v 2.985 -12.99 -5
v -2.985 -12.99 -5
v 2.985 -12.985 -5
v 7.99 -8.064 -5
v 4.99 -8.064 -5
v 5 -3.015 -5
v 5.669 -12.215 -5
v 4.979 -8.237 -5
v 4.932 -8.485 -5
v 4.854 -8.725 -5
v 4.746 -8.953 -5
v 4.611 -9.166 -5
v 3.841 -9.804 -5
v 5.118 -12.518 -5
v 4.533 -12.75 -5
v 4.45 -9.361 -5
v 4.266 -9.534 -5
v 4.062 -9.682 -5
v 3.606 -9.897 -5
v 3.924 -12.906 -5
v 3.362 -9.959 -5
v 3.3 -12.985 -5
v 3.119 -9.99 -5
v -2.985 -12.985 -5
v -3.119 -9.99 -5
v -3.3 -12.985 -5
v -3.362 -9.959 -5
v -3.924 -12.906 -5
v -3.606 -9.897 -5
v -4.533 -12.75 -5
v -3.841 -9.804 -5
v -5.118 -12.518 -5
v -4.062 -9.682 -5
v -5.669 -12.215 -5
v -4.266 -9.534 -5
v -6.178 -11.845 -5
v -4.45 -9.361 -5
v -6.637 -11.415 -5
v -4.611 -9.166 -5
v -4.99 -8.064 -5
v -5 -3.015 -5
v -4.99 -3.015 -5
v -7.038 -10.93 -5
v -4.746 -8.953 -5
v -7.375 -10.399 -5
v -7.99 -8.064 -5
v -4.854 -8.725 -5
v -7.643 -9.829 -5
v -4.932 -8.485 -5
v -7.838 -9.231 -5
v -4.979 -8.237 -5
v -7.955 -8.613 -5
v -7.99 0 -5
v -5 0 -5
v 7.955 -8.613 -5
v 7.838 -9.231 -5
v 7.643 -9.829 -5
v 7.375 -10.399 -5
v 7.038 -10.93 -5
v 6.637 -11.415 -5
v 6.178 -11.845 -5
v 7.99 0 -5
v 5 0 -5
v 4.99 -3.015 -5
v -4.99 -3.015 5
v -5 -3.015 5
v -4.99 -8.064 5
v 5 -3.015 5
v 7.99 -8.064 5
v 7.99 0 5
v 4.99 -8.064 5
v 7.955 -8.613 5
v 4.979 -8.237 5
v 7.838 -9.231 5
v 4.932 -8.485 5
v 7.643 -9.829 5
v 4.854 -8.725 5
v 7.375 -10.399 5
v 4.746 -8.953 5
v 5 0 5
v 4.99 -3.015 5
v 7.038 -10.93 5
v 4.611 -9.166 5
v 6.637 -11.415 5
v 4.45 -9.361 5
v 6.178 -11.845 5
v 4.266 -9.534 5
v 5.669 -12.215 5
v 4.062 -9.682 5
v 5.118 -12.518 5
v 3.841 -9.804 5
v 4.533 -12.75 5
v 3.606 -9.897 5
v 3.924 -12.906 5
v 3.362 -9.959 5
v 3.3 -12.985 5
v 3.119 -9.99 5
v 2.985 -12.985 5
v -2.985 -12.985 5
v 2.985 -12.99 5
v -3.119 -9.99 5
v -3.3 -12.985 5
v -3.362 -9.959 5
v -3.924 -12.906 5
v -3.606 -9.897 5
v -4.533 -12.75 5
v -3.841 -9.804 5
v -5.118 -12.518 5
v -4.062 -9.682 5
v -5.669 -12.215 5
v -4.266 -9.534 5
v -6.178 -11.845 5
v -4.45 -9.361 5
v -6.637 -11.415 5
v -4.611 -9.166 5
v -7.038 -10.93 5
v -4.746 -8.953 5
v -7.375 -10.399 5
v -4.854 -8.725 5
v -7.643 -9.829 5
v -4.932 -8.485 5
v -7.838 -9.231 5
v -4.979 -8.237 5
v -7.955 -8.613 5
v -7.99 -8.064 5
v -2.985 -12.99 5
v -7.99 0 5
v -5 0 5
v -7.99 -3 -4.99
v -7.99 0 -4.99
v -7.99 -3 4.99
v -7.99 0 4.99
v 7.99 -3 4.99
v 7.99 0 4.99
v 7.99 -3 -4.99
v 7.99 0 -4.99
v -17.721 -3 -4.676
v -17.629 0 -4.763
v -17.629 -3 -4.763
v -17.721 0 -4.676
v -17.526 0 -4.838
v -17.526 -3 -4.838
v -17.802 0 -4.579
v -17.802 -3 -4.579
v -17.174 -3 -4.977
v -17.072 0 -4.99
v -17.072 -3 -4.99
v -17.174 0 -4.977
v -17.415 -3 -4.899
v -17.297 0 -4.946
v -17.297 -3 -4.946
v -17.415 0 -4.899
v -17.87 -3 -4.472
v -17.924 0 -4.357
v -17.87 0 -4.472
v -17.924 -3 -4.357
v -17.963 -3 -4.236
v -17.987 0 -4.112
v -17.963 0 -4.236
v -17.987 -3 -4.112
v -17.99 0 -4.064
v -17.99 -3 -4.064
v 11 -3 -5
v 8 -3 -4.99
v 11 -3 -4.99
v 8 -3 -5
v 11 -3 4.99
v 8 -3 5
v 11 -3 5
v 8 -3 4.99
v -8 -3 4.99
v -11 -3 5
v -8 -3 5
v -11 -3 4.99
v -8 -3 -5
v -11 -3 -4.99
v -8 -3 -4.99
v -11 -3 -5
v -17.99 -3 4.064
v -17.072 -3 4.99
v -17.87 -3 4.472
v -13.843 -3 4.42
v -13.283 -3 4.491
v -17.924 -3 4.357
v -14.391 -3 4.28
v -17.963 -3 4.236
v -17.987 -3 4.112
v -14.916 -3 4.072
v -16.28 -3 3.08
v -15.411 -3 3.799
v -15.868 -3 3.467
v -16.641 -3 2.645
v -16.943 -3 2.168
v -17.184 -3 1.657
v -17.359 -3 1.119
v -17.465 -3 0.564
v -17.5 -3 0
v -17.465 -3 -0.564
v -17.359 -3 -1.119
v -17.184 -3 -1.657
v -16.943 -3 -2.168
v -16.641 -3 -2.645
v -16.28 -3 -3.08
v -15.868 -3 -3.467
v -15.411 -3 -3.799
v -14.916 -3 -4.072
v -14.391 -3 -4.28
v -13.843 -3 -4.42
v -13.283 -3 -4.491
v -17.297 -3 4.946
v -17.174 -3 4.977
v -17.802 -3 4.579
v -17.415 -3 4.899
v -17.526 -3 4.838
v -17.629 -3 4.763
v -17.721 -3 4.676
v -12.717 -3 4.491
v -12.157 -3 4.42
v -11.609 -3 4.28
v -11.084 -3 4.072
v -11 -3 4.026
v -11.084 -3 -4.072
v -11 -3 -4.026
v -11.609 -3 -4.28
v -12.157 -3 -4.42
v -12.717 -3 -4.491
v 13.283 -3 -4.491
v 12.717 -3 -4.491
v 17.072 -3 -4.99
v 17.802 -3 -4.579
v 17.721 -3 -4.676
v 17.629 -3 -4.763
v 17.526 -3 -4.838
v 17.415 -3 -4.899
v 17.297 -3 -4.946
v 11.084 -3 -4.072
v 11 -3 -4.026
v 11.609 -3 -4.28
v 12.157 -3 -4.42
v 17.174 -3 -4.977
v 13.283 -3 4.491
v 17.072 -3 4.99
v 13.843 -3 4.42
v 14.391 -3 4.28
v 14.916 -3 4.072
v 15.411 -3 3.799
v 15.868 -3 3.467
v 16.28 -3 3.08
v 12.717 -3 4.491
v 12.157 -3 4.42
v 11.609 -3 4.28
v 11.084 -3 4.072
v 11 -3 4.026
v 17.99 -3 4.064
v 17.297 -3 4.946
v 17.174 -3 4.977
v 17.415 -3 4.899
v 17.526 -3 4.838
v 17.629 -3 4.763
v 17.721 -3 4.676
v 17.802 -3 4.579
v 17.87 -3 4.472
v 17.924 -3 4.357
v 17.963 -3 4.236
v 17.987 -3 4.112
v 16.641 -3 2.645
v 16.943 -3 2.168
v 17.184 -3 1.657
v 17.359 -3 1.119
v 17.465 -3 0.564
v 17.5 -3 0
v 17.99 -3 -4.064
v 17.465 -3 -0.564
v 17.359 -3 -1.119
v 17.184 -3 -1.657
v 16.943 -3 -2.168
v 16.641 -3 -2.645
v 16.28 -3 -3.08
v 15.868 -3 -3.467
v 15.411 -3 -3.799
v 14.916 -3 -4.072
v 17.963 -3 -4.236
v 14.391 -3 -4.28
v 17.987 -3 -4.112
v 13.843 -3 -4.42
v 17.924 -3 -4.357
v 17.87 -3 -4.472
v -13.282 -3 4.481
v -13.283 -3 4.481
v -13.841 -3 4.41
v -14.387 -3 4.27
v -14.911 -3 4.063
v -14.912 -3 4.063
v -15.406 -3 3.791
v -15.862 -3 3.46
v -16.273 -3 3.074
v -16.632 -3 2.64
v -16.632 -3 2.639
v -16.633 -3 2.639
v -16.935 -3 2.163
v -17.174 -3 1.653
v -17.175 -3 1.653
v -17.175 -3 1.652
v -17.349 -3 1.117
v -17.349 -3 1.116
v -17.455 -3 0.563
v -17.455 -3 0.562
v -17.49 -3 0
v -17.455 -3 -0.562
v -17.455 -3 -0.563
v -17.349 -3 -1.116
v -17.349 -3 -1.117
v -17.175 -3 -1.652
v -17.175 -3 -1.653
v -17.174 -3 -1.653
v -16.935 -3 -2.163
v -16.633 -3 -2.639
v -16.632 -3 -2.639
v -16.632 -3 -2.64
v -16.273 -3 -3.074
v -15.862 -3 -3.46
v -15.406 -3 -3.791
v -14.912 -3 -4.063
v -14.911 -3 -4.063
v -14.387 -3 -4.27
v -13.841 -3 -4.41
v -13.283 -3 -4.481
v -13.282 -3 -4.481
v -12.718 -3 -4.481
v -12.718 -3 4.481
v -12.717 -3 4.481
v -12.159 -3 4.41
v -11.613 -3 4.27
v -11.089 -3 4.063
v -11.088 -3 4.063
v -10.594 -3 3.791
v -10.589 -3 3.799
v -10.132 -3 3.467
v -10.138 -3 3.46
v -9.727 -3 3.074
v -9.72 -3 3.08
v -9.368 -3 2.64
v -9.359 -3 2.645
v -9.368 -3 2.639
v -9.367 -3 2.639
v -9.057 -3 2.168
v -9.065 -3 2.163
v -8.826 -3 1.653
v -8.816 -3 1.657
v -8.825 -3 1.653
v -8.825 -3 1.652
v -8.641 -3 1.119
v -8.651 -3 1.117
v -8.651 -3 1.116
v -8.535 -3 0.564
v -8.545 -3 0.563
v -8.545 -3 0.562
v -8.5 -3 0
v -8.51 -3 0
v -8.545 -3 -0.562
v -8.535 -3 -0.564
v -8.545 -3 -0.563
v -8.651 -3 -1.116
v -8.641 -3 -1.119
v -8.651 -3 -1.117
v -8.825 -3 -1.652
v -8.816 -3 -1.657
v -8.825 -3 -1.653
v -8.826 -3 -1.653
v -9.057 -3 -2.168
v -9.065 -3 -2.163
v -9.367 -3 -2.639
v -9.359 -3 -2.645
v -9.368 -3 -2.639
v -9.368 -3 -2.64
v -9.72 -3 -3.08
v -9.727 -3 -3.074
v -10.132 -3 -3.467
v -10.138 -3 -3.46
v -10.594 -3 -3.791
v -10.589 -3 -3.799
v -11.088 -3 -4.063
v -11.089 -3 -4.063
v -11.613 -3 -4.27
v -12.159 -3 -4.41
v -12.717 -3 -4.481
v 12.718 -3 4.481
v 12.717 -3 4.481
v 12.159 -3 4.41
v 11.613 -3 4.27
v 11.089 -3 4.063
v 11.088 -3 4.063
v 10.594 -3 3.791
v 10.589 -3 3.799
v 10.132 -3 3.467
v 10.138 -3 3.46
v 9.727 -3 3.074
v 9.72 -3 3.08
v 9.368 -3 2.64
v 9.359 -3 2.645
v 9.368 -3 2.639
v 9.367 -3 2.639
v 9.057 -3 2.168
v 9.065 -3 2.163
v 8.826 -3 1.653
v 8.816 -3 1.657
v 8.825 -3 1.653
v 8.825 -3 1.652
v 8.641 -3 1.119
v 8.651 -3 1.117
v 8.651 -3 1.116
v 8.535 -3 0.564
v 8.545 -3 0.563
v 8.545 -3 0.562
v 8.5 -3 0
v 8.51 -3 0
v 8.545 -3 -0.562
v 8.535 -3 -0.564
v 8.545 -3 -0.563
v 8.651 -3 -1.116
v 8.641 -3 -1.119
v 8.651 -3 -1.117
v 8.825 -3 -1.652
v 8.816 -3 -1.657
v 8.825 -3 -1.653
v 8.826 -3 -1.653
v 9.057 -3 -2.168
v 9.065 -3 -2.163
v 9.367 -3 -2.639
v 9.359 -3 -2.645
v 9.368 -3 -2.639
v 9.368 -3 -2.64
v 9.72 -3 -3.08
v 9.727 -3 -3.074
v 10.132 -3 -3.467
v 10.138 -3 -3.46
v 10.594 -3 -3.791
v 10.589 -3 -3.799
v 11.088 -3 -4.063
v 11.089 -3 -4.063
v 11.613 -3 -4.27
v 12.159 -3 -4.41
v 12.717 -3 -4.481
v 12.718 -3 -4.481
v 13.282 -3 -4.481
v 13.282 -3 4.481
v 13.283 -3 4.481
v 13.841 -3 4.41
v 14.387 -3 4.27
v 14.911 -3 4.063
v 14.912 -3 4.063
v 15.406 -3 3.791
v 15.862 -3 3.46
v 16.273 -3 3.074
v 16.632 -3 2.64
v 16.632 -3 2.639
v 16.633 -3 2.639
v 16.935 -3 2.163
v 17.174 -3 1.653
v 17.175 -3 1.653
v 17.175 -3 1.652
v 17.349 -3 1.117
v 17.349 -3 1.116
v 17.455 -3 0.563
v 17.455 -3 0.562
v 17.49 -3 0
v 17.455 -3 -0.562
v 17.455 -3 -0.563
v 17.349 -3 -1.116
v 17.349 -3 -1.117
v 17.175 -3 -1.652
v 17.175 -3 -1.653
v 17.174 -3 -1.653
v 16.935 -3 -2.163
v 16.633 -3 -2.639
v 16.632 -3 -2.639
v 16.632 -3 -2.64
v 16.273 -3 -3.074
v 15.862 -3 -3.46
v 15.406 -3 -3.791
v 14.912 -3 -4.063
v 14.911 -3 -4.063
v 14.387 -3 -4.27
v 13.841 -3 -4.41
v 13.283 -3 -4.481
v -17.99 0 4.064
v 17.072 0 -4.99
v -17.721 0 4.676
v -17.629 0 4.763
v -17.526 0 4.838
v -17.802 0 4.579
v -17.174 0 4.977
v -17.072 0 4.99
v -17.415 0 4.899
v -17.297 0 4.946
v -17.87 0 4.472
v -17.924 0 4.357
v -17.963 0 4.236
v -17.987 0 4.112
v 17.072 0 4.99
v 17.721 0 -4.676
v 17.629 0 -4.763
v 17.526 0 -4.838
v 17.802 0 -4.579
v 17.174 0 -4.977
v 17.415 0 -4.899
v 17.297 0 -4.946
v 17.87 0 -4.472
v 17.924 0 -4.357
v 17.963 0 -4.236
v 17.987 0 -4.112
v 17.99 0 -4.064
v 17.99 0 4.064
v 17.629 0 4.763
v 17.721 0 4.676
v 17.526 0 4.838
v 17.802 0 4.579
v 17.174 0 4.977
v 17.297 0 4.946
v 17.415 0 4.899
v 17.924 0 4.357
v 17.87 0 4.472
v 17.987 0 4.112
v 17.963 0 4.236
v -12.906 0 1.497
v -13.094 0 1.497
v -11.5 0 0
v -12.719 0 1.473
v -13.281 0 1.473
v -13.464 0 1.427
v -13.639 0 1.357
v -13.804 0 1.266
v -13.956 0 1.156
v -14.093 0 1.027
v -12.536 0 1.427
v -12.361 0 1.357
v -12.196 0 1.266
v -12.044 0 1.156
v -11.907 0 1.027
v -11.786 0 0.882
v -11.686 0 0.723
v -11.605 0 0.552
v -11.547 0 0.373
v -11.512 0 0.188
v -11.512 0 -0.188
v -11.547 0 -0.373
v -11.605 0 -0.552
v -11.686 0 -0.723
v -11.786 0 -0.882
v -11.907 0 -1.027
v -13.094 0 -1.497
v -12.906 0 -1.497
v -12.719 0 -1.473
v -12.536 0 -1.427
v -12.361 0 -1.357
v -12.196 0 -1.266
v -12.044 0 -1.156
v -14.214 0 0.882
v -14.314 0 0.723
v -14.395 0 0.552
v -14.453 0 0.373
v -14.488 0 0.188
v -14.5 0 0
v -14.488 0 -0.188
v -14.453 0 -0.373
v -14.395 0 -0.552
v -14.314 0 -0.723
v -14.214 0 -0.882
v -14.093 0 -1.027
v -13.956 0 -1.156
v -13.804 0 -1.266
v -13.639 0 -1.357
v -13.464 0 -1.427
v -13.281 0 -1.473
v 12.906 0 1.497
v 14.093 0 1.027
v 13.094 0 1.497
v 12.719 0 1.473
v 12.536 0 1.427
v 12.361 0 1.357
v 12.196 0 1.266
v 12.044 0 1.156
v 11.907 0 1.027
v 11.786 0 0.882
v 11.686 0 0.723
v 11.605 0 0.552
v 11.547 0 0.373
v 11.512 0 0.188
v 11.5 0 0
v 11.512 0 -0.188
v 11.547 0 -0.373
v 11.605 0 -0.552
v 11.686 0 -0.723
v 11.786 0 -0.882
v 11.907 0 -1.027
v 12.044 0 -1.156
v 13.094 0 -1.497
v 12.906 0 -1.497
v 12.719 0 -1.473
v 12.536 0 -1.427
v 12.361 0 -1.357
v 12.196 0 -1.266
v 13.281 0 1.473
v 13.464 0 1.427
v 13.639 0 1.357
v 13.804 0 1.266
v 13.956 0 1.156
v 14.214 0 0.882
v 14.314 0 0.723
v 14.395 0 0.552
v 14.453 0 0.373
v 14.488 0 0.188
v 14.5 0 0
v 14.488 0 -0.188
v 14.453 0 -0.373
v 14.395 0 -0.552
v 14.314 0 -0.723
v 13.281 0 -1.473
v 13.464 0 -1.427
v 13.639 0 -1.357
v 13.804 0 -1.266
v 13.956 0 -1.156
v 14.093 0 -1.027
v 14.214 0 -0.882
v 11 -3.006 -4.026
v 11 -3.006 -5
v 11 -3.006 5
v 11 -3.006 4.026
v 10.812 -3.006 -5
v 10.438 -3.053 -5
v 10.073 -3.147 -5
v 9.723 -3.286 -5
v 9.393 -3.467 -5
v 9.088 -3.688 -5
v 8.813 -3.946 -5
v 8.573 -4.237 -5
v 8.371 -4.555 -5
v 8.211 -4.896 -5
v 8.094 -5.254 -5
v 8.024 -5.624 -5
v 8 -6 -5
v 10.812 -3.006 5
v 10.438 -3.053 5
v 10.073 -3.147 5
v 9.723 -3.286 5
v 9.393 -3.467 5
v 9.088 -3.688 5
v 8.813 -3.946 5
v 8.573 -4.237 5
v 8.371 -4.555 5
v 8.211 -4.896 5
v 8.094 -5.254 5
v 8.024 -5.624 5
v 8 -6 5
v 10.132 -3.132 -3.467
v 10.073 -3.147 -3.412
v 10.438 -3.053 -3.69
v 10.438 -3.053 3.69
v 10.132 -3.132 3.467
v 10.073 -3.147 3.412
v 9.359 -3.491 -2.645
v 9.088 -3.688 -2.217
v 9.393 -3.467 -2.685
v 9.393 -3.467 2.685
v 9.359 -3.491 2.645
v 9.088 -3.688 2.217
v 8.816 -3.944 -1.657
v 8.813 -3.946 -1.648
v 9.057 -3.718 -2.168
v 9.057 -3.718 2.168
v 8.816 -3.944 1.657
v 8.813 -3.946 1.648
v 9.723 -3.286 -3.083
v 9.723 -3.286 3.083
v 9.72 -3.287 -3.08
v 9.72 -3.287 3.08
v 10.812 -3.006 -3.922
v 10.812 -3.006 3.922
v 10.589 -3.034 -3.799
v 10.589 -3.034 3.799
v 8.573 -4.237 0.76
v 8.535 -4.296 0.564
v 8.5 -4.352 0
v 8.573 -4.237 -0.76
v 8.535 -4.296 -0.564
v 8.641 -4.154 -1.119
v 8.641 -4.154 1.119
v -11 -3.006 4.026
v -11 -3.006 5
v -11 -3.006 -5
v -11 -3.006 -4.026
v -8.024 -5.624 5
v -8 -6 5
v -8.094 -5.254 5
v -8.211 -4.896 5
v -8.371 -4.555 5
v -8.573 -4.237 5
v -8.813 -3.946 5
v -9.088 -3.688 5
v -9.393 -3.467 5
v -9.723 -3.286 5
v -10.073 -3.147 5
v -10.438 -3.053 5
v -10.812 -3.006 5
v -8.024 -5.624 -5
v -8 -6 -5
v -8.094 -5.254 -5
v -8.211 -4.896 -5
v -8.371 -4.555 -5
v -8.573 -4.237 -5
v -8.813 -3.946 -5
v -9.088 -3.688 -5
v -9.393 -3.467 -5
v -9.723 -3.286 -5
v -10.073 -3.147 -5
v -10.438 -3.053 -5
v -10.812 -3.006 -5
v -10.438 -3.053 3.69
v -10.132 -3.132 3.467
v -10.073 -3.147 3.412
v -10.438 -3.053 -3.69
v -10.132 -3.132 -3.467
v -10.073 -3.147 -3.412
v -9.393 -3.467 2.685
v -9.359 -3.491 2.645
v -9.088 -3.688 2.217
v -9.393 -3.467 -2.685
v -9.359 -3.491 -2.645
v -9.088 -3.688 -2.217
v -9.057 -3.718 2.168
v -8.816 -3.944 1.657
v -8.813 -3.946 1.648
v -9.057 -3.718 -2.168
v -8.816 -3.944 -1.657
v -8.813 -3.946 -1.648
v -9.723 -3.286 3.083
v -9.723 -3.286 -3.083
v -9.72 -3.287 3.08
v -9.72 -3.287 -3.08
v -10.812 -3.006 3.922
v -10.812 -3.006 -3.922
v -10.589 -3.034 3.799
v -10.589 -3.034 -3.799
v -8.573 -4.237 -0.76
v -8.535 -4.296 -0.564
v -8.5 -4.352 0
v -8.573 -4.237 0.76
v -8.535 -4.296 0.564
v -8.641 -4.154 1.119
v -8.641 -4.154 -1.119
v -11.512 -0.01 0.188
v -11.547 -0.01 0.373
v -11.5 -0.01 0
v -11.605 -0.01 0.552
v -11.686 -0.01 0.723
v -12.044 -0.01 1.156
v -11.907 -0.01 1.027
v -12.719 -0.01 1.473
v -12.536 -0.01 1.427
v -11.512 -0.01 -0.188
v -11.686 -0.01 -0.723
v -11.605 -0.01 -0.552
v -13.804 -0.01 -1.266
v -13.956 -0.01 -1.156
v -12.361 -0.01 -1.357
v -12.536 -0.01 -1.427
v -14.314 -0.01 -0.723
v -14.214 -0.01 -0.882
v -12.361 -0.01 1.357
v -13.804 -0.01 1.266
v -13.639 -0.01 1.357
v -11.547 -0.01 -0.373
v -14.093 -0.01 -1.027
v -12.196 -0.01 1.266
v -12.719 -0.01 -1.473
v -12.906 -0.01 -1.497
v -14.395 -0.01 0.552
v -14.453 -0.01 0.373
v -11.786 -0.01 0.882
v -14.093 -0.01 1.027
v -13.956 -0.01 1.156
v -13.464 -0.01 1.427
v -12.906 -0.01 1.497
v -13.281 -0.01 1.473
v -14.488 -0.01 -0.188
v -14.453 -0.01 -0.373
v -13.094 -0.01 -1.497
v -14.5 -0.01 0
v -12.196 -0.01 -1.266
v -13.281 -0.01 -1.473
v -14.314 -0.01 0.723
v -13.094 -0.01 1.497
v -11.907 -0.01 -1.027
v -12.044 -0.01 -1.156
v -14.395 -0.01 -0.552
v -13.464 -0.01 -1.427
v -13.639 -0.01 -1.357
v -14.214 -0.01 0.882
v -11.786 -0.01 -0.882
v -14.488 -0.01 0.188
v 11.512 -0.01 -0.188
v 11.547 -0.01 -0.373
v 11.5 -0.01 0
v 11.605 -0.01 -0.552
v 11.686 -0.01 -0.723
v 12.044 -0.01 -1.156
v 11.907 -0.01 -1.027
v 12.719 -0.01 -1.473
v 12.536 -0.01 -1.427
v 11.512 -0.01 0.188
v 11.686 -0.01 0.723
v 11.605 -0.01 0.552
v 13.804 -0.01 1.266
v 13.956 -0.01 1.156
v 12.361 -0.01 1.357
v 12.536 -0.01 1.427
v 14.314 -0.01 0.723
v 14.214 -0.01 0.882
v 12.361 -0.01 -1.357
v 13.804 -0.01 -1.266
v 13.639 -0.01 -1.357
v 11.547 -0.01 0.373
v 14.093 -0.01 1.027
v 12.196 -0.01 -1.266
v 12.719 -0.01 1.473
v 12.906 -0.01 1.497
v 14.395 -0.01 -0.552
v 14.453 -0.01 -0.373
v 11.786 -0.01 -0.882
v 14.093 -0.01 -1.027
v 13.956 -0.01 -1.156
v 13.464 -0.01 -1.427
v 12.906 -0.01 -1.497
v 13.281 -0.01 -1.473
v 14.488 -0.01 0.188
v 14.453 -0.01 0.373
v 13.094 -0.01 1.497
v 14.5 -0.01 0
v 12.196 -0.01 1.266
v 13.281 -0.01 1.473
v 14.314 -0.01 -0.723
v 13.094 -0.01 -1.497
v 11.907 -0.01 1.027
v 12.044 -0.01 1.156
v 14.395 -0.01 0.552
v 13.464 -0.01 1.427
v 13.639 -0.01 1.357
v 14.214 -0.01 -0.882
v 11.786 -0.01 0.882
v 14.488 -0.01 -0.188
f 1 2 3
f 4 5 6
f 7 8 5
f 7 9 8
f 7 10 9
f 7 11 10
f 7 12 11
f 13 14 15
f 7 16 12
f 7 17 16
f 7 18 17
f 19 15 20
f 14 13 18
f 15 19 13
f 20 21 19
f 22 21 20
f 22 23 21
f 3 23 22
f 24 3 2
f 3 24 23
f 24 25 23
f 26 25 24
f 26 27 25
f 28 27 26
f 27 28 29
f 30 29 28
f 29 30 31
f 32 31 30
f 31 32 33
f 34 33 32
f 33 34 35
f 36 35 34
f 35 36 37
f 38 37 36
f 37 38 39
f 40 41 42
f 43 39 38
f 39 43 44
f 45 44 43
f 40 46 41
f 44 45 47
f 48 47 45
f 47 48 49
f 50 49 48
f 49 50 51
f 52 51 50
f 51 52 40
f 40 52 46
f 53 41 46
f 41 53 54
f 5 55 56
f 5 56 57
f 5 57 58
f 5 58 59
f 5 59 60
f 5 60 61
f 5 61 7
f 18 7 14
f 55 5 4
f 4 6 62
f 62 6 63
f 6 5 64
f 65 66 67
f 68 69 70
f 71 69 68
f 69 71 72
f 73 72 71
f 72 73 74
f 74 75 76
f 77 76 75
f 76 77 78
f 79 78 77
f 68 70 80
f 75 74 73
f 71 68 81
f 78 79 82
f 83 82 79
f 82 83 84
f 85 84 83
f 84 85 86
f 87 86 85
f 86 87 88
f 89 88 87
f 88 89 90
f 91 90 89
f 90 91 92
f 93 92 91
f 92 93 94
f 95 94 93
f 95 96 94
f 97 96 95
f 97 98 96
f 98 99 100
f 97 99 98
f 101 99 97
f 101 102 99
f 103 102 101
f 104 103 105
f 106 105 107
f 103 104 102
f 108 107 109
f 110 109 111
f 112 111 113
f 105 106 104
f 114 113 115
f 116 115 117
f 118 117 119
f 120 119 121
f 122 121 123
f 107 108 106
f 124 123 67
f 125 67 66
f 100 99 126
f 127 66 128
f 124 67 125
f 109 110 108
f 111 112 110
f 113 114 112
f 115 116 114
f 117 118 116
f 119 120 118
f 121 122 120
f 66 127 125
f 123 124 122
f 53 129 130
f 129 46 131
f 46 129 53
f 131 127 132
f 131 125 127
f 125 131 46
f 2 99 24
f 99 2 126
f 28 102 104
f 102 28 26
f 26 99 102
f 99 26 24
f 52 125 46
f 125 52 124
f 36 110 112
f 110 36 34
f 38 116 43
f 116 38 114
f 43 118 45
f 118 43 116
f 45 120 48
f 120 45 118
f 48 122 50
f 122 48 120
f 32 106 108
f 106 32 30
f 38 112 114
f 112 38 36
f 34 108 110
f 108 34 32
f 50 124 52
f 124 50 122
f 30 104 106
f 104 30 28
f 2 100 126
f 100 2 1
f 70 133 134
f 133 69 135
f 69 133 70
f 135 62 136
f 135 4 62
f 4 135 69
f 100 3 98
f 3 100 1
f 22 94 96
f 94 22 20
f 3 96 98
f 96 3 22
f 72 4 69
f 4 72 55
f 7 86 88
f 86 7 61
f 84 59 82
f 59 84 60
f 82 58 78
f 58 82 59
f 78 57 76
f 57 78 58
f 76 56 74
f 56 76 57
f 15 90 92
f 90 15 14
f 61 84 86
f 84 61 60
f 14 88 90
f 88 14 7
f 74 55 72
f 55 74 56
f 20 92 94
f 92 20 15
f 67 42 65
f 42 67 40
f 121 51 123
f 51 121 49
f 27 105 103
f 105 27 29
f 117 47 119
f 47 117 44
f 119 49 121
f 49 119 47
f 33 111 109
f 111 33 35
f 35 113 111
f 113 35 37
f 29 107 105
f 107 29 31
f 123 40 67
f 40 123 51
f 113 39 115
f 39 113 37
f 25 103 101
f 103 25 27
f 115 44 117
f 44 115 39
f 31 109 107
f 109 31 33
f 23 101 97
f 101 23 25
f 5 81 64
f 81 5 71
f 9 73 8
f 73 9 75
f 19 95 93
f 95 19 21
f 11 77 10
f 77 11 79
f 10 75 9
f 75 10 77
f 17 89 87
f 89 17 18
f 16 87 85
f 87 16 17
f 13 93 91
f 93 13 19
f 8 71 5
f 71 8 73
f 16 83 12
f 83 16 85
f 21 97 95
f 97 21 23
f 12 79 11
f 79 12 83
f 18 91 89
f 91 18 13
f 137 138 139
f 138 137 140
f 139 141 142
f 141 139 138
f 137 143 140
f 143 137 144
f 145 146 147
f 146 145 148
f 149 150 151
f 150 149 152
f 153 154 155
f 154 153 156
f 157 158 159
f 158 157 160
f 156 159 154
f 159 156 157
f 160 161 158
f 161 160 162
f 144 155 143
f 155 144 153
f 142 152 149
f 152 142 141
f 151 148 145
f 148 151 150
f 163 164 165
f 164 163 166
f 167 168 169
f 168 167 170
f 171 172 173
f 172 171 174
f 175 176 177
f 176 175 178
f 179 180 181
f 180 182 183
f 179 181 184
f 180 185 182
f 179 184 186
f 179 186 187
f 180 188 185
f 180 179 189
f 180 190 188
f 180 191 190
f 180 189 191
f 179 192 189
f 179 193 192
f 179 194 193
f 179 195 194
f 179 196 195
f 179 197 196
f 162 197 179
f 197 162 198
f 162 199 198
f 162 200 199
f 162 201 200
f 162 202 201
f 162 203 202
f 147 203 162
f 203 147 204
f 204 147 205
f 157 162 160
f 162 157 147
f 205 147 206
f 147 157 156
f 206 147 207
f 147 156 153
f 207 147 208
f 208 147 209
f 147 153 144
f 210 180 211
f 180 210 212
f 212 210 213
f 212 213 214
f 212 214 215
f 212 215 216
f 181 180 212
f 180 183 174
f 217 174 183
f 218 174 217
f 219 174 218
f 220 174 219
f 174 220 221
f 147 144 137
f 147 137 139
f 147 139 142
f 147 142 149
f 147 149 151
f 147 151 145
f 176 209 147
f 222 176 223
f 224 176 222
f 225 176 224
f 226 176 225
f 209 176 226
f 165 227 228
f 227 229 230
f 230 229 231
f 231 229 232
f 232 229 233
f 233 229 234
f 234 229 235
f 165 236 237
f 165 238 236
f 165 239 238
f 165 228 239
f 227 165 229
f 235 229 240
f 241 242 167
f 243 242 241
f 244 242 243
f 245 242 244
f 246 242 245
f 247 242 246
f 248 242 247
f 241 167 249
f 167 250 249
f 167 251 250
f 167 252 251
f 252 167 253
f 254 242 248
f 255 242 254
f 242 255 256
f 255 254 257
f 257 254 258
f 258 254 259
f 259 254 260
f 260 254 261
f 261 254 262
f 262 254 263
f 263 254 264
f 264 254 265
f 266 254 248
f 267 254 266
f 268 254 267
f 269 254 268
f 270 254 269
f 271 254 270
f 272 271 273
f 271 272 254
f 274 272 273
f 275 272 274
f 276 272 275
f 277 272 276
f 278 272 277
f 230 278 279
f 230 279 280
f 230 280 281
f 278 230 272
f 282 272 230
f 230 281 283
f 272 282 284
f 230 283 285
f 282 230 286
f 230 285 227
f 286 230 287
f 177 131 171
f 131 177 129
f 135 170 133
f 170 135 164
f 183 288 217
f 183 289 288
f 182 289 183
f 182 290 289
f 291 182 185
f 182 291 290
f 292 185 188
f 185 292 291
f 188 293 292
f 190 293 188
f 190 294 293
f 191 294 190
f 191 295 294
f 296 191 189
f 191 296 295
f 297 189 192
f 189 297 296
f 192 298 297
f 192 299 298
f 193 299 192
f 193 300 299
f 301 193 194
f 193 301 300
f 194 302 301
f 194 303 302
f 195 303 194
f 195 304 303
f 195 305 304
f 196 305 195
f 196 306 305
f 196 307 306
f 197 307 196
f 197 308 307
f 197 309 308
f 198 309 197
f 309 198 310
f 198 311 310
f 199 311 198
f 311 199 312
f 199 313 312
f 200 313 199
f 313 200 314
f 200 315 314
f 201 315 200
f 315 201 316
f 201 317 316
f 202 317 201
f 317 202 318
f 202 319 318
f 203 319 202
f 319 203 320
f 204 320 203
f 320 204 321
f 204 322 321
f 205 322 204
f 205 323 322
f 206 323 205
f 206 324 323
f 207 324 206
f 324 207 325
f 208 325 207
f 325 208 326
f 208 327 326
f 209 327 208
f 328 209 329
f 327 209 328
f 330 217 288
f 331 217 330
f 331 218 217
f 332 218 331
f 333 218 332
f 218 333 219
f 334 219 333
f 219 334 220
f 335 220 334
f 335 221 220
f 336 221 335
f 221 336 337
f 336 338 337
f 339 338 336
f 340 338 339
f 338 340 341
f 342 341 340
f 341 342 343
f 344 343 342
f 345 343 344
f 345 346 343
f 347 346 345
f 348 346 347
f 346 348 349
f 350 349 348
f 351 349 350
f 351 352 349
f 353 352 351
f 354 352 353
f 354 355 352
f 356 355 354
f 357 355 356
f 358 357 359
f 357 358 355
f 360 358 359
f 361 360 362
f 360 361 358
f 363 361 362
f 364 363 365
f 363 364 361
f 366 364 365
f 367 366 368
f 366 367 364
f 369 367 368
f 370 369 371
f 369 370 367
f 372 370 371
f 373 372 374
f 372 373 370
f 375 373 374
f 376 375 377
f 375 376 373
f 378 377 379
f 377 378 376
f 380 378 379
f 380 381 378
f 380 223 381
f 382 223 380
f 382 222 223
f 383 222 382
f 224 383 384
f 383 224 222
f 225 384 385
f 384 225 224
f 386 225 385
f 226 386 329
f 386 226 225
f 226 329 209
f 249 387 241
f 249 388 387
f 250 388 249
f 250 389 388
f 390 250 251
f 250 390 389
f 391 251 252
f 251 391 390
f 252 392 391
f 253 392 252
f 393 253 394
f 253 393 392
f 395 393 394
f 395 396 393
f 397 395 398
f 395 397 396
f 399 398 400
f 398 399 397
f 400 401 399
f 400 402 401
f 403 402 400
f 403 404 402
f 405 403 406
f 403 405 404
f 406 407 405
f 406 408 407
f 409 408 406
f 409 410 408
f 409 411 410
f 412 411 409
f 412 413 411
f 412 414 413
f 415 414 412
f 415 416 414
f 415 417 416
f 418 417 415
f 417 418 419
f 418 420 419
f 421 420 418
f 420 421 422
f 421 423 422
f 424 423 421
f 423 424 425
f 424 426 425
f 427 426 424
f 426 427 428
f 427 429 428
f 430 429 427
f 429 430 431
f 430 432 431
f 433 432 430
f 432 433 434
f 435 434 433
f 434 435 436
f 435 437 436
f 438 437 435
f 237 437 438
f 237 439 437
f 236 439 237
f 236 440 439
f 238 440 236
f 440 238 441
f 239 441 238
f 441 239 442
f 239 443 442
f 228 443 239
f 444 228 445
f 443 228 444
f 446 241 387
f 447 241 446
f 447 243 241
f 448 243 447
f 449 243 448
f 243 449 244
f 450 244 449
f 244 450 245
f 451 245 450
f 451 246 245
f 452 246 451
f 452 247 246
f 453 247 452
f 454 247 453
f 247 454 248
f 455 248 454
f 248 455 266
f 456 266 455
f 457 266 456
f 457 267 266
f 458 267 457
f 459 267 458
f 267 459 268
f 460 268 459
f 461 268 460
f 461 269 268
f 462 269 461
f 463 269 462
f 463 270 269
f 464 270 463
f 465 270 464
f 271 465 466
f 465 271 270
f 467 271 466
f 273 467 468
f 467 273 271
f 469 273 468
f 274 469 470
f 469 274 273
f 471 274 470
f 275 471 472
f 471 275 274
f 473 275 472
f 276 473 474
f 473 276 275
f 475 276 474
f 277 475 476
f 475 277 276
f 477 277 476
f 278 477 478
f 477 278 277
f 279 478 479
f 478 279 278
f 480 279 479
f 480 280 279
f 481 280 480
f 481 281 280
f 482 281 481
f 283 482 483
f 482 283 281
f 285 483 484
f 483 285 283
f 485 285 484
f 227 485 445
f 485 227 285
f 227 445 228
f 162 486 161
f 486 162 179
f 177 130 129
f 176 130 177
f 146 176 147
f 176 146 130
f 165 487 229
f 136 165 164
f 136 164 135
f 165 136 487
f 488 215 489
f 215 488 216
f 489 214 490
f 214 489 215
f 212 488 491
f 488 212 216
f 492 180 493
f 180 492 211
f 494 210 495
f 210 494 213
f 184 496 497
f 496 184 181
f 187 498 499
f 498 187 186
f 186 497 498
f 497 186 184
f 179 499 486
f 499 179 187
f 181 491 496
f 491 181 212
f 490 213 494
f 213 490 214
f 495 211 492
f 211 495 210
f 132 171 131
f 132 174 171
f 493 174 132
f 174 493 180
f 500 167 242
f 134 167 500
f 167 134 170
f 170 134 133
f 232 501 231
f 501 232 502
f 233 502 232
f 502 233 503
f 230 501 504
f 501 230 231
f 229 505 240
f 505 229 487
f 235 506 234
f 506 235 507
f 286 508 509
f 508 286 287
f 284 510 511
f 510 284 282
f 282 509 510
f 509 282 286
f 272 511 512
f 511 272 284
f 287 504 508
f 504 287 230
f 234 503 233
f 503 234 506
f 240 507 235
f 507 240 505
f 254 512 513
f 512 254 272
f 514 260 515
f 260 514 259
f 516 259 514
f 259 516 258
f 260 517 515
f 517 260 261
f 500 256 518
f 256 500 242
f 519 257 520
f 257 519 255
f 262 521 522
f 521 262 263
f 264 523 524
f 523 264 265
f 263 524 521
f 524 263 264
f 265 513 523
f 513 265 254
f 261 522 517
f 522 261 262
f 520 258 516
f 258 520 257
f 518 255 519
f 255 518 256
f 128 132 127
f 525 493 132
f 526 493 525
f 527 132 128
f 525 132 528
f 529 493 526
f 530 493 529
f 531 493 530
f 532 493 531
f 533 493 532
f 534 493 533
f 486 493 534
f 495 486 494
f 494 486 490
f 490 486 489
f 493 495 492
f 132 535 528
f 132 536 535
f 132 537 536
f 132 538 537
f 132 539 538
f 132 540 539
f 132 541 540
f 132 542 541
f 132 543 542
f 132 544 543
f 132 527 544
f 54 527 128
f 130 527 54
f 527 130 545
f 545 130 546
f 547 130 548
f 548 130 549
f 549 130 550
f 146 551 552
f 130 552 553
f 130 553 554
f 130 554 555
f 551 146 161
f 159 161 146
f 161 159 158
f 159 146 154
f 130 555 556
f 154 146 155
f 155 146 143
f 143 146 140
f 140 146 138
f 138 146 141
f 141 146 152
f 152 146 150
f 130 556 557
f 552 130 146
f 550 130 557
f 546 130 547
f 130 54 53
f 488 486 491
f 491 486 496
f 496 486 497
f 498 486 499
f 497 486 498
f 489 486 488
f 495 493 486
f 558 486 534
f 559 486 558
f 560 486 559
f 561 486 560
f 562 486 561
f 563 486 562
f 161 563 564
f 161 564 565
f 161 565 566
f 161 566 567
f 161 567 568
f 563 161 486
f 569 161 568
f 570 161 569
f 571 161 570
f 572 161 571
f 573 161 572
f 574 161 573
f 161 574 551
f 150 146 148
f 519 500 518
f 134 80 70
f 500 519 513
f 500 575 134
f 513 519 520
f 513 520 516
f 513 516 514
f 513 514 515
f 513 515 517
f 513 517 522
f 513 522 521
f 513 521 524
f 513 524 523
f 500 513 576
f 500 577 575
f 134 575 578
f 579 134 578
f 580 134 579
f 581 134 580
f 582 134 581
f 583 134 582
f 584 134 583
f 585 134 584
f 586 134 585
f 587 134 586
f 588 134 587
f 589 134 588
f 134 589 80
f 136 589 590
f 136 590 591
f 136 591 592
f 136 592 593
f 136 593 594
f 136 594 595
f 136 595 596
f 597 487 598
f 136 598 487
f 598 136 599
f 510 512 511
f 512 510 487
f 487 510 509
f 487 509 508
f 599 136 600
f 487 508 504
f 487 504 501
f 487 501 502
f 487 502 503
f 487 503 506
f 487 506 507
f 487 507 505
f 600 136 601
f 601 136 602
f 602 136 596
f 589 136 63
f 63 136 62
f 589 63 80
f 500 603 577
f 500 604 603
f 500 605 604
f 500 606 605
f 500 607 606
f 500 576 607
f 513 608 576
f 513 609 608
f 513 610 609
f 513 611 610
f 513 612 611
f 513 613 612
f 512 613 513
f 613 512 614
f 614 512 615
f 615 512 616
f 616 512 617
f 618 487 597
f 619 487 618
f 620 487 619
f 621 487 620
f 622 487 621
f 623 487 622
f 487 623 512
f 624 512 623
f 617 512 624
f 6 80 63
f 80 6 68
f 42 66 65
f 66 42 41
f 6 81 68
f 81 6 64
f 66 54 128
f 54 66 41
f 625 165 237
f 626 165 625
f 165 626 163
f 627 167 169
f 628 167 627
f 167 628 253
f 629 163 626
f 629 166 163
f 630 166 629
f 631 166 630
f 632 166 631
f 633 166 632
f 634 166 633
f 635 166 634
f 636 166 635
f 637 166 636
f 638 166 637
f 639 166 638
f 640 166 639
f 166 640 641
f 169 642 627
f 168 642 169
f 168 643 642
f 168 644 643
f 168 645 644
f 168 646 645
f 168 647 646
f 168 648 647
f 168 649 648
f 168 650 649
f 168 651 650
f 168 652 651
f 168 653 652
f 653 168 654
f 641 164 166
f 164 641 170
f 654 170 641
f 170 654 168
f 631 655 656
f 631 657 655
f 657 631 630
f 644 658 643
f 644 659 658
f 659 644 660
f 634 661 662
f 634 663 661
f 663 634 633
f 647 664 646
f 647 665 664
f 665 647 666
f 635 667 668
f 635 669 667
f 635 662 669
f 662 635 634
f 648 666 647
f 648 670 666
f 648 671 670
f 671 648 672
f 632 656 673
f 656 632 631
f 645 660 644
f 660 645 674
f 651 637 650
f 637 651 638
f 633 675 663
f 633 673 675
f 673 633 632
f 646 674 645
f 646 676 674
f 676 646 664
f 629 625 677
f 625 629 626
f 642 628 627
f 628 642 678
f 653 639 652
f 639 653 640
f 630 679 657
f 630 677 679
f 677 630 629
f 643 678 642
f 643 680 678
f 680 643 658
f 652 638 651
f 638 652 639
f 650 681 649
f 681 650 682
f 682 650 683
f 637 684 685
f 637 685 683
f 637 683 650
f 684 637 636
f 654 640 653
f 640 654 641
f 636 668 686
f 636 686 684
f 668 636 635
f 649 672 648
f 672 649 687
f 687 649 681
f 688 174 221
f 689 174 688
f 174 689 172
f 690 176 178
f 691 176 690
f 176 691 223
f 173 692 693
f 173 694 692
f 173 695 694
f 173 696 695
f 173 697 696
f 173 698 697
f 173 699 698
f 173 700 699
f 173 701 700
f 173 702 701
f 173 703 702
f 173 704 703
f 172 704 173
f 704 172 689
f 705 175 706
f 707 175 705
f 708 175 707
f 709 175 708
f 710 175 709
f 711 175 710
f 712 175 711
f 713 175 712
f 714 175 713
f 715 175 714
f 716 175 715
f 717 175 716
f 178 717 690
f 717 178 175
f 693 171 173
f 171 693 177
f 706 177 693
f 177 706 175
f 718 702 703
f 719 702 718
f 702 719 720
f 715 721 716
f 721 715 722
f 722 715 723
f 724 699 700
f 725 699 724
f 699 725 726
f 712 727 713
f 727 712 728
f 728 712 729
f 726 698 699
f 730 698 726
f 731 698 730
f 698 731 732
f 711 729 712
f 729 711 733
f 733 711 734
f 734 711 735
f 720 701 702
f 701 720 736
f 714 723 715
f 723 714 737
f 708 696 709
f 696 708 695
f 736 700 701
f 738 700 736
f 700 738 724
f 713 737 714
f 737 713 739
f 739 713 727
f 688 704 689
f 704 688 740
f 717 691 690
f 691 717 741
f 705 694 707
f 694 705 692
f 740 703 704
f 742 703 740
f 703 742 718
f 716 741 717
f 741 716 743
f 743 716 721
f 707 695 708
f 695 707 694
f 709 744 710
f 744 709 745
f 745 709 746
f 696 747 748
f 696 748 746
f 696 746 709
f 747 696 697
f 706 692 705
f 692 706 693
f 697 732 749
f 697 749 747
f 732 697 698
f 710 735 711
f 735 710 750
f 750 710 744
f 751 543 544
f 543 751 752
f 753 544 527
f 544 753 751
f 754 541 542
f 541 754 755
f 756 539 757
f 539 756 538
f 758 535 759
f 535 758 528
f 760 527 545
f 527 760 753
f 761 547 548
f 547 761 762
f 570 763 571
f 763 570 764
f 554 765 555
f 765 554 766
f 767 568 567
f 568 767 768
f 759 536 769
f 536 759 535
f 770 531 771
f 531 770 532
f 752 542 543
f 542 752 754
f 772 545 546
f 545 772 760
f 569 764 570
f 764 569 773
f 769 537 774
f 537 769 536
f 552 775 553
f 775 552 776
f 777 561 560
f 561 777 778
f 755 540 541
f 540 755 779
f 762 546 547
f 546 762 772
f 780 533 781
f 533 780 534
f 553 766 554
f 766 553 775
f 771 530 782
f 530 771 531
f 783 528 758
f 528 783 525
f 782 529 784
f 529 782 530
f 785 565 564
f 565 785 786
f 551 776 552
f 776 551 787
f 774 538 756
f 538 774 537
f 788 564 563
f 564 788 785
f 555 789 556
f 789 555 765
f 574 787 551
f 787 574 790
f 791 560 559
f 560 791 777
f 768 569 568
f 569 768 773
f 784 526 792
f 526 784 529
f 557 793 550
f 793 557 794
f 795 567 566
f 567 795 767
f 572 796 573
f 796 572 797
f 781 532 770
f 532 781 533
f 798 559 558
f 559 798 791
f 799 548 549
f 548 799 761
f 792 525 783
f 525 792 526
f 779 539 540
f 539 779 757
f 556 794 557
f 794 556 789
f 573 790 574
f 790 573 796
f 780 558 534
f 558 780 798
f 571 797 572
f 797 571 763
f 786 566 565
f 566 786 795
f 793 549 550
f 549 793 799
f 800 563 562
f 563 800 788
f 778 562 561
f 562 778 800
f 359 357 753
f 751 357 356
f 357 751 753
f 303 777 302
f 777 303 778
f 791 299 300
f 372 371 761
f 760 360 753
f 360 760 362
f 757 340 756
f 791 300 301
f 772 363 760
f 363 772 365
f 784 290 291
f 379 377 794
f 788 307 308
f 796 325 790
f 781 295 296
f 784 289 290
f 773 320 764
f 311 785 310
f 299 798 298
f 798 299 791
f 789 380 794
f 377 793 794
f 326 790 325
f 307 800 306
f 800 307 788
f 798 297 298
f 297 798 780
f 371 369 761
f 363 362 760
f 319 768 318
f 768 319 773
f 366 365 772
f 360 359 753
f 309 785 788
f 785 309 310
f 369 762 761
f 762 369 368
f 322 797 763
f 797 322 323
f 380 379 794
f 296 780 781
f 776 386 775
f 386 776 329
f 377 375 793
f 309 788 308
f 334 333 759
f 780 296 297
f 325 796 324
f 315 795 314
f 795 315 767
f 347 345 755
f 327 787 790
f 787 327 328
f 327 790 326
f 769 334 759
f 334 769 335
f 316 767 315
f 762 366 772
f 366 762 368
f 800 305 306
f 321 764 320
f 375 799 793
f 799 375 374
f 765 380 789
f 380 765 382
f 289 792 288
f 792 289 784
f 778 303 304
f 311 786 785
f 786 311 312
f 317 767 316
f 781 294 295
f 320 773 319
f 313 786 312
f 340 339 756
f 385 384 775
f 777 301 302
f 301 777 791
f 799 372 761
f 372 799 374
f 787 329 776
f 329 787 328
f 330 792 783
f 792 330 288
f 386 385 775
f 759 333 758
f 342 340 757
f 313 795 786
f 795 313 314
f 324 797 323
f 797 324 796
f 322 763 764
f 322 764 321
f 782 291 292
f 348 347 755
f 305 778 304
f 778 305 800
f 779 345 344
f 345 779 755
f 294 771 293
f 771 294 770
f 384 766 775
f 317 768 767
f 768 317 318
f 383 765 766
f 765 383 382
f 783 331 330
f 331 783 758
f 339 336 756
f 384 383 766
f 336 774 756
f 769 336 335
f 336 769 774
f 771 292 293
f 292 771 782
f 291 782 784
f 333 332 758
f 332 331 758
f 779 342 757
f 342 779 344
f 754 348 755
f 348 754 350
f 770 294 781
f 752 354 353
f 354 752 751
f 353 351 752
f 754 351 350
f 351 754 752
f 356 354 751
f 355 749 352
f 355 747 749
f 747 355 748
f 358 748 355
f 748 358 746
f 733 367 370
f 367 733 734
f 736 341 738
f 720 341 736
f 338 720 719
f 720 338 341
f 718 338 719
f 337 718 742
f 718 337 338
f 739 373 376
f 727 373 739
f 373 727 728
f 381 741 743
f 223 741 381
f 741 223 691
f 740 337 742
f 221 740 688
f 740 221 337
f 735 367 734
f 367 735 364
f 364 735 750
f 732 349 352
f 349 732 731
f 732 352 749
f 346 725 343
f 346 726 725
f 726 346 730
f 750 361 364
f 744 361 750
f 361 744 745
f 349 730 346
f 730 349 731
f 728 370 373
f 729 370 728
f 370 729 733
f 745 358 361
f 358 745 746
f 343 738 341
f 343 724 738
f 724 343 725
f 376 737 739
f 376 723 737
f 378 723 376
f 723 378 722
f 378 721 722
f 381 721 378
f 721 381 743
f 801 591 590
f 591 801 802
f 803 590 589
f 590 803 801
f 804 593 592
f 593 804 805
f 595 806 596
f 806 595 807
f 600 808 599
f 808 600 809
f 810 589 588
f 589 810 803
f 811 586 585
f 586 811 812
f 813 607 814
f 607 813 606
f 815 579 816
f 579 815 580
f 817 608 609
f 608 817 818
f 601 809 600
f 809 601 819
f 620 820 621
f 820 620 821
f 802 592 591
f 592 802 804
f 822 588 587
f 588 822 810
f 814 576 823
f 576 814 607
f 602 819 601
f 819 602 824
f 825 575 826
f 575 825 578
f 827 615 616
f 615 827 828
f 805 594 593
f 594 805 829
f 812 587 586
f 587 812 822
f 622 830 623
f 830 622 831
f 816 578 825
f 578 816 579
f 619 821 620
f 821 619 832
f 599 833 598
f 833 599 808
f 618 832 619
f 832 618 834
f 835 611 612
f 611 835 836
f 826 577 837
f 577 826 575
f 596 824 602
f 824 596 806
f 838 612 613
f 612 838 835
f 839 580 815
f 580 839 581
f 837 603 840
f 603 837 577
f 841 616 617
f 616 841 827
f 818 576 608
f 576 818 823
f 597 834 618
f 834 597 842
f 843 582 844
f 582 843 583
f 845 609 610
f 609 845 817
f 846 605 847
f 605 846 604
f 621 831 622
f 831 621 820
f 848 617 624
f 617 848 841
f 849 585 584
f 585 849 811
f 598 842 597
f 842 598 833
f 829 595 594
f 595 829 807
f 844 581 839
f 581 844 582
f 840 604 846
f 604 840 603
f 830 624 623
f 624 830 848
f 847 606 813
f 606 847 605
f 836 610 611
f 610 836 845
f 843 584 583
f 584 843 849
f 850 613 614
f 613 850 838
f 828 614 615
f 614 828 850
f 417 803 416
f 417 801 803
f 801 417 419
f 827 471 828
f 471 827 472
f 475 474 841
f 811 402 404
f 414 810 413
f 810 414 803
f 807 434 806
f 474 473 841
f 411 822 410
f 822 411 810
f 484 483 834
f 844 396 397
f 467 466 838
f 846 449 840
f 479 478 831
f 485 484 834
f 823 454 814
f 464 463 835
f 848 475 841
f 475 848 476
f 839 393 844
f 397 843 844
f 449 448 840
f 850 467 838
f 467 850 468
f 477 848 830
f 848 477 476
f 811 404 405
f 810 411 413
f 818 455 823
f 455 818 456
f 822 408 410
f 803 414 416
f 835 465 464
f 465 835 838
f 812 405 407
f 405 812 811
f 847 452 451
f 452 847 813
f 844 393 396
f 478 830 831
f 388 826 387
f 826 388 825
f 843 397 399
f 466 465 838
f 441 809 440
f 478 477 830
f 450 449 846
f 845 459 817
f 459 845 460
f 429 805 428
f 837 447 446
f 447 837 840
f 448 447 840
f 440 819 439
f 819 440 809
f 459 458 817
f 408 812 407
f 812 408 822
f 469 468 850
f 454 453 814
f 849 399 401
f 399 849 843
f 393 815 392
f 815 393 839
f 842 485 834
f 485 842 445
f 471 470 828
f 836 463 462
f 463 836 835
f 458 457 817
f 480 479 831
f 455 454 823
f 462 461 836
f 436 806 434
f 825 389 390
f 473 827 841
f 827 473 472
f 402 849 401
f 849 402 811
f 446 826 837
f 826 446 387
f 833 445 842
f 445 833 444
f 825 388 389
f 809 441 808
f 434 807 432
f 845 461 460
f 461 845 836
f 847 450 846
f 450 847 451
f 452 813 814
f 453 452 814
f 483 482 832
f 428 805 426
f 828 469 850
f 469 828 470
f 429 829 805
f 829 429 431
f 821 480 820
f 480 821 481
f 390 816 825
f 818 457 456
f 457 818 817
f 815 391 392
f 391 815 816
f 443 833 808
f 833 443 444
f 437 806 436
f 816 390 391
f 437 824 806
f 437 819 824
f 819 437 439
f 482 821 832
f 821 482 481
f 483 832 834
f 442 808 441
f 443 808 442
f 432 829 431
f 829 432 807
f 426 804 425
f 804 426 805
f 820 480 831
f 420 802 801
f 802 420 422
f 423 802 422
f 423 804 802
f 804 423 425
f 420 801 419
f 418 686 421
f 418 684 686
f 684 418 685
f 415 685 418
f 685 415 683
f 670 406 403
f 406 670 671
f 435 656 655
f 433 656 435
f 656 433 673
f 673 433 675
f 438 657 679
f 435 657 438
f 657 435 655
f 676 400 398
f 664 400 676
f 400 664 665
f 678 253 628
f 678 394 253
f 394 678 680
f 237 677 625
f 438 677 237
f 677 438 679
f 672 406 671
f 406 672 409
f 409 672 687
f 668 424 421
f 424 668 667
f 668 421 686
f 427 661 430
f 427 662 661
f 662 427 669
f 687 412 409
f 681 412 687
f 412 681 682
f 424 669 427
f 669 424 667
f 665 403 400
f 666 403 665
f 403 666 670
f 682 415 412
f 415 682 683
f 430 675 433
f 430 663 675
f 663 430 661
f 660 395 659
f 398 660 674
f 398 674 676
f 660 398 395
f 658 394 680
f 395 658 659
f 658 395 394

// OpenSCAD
// bracket_mount.scad
// library for parametric bracket, mount, clamp, holder, clip, grip, strap, hanger
// Author: Tony Z. Tonchev, Michigan (USA) 
// last update: November 2018



// (in mm)
Bracket_Width = 10;

// (in mm)
Bracket_Height = 10;

// (in mm)
Bracket_Span = 10;

// (in mm)
Bracket_Thickness = 3;


/* [Hidden] */

$fn=50;
TZT_BR=min(Bracket_Span,Bracket_Height)/2;
TZT_BW=max(10,Bracket_Width);
TZT_BH=max(Bracket_Height,Bracket_Thickness)+Bracket_Thickness;
TZT_BS=Bracket_Span+2*Bracket_Thickness;
TZT_BT=Bracket_Thickness;

rotate ([90,0,0]) difference () {
    union () {
        difference () {
            union () {
                rotate ([90,0,0]) TZT_Pipe (TZT_BH*2,TZT_BS,TZT_BW,TZT_BR,TZT_BT);
                TZT_Rod (TZT_BW,TZT_BS+20,min(TZT_BT,10)*2,1);
            }
            translate ([0,0,-TZT_BH/2]) cube ([TZT_BS+20,TZT_BW+.01,TZT_BH],true);
            cube ([TZT_BS-TZT_BT*2,TZT_BW+.01,TZT_BT*2.01],true);
        }
        TZT_a=min(TZT_BT,5,TZT_BR);
        for (TZT_i=[0:180:180]) {
            rotate ([0,0,TZT_i]) translate ([TZT_BS/2+TZT_a/2,0,TZT_BT+TZT_a/2]) rotate ([90,0,0]) TZT_InRad (TZT_a, TZT_BW);
        }
    }
    for (TZT_i=[0:180:180]) {
        if (TZT_BW<40) {
            rotate ([0,0,TZT_i]) translate ([-TZT_BS/2-5,0,-3]) TZT_ScrHole ();
        } else {
            for (TZT_a=[-1:2:1]) {
                rotate ([0,0,TZT_i]) translate ([-TZT_BS/2-5,TZT_a*TZT_BW/4,-3]) TZT_ScrHole ();
            }
        }
    }
}

// 3mm screw hole - recessed at 3mm+
// TZT_ScrHole ()
module TZT_ScrHole () {
    cylinder (TZT_BT+1,1.5,1.5);
    translate ([0,0,+TZT_BT+.01]) if (TZT_BT<3) {
        cylinder (3.1,1.5,1.5);
    } else {    
        cylinder (3,1.5,4.5);
    }
    translate ([0,0,+TZT_BT+3]) cylinder (3,4.5,4.5);
}

// Rounded corner rectangular pipe
// TZT_Pipe (Width, Height, Length, Corner_Radius, Wall_Thickness)
module TZT_Pipe (TZT_w,TZT_h,TZT_l,TZT_r,TZT_t) {
    difference () {
        TZT_Rod (TZT_w,TZT_h,TZT_l,TZT_r);
        TZT_Rod (TZT_w-2*TZT_t,TZT_h-2*TZT_t,TZT_l+.01,TZT_r-TZT_t);
    }
}

// Rounded inside corner
// TZT_InRad (Width, Length)
module TZT_InRad (TZT_w, TZT_l) {
    difference () {
        cube ([TZT_w,TZT_w,TZT_l],true);
        translate ([TZT_w/2,TZT_w/2,0]) cylinder (TZT_l+.01,TZT_w,TZT_w,true);
    }
}

// Rounded corner rectangular rod
// TZT_Rod (Width, Height, Length, Corner_Radius)
module TZT_Rod (TZT_w,TZT_h,TZT_l,TZT_r) {
    iTZT_RH ();
    mirror ([1,0,0]) iTZT_RH ();
    module iTZT_RH () {
        iTZT_RQ (); 
        mirror ([0,1,0]) iTZT_RQ ();
    }
    module iTZT_RQ () {
        translate ([-TZT_h/4+.01,-TZT_w/4+.01,0]) {
            difference () {
                cube ([TZT_h/2,TZT_w/2,TZT_l],true);
                translate ([-TZT_h/4+TZT_r/2,-TZT_w/4+TZT_r/2,0]) TZT_InRad (TZT_r+.01, TZT_l+.01);
            }
        }
    }    
}
